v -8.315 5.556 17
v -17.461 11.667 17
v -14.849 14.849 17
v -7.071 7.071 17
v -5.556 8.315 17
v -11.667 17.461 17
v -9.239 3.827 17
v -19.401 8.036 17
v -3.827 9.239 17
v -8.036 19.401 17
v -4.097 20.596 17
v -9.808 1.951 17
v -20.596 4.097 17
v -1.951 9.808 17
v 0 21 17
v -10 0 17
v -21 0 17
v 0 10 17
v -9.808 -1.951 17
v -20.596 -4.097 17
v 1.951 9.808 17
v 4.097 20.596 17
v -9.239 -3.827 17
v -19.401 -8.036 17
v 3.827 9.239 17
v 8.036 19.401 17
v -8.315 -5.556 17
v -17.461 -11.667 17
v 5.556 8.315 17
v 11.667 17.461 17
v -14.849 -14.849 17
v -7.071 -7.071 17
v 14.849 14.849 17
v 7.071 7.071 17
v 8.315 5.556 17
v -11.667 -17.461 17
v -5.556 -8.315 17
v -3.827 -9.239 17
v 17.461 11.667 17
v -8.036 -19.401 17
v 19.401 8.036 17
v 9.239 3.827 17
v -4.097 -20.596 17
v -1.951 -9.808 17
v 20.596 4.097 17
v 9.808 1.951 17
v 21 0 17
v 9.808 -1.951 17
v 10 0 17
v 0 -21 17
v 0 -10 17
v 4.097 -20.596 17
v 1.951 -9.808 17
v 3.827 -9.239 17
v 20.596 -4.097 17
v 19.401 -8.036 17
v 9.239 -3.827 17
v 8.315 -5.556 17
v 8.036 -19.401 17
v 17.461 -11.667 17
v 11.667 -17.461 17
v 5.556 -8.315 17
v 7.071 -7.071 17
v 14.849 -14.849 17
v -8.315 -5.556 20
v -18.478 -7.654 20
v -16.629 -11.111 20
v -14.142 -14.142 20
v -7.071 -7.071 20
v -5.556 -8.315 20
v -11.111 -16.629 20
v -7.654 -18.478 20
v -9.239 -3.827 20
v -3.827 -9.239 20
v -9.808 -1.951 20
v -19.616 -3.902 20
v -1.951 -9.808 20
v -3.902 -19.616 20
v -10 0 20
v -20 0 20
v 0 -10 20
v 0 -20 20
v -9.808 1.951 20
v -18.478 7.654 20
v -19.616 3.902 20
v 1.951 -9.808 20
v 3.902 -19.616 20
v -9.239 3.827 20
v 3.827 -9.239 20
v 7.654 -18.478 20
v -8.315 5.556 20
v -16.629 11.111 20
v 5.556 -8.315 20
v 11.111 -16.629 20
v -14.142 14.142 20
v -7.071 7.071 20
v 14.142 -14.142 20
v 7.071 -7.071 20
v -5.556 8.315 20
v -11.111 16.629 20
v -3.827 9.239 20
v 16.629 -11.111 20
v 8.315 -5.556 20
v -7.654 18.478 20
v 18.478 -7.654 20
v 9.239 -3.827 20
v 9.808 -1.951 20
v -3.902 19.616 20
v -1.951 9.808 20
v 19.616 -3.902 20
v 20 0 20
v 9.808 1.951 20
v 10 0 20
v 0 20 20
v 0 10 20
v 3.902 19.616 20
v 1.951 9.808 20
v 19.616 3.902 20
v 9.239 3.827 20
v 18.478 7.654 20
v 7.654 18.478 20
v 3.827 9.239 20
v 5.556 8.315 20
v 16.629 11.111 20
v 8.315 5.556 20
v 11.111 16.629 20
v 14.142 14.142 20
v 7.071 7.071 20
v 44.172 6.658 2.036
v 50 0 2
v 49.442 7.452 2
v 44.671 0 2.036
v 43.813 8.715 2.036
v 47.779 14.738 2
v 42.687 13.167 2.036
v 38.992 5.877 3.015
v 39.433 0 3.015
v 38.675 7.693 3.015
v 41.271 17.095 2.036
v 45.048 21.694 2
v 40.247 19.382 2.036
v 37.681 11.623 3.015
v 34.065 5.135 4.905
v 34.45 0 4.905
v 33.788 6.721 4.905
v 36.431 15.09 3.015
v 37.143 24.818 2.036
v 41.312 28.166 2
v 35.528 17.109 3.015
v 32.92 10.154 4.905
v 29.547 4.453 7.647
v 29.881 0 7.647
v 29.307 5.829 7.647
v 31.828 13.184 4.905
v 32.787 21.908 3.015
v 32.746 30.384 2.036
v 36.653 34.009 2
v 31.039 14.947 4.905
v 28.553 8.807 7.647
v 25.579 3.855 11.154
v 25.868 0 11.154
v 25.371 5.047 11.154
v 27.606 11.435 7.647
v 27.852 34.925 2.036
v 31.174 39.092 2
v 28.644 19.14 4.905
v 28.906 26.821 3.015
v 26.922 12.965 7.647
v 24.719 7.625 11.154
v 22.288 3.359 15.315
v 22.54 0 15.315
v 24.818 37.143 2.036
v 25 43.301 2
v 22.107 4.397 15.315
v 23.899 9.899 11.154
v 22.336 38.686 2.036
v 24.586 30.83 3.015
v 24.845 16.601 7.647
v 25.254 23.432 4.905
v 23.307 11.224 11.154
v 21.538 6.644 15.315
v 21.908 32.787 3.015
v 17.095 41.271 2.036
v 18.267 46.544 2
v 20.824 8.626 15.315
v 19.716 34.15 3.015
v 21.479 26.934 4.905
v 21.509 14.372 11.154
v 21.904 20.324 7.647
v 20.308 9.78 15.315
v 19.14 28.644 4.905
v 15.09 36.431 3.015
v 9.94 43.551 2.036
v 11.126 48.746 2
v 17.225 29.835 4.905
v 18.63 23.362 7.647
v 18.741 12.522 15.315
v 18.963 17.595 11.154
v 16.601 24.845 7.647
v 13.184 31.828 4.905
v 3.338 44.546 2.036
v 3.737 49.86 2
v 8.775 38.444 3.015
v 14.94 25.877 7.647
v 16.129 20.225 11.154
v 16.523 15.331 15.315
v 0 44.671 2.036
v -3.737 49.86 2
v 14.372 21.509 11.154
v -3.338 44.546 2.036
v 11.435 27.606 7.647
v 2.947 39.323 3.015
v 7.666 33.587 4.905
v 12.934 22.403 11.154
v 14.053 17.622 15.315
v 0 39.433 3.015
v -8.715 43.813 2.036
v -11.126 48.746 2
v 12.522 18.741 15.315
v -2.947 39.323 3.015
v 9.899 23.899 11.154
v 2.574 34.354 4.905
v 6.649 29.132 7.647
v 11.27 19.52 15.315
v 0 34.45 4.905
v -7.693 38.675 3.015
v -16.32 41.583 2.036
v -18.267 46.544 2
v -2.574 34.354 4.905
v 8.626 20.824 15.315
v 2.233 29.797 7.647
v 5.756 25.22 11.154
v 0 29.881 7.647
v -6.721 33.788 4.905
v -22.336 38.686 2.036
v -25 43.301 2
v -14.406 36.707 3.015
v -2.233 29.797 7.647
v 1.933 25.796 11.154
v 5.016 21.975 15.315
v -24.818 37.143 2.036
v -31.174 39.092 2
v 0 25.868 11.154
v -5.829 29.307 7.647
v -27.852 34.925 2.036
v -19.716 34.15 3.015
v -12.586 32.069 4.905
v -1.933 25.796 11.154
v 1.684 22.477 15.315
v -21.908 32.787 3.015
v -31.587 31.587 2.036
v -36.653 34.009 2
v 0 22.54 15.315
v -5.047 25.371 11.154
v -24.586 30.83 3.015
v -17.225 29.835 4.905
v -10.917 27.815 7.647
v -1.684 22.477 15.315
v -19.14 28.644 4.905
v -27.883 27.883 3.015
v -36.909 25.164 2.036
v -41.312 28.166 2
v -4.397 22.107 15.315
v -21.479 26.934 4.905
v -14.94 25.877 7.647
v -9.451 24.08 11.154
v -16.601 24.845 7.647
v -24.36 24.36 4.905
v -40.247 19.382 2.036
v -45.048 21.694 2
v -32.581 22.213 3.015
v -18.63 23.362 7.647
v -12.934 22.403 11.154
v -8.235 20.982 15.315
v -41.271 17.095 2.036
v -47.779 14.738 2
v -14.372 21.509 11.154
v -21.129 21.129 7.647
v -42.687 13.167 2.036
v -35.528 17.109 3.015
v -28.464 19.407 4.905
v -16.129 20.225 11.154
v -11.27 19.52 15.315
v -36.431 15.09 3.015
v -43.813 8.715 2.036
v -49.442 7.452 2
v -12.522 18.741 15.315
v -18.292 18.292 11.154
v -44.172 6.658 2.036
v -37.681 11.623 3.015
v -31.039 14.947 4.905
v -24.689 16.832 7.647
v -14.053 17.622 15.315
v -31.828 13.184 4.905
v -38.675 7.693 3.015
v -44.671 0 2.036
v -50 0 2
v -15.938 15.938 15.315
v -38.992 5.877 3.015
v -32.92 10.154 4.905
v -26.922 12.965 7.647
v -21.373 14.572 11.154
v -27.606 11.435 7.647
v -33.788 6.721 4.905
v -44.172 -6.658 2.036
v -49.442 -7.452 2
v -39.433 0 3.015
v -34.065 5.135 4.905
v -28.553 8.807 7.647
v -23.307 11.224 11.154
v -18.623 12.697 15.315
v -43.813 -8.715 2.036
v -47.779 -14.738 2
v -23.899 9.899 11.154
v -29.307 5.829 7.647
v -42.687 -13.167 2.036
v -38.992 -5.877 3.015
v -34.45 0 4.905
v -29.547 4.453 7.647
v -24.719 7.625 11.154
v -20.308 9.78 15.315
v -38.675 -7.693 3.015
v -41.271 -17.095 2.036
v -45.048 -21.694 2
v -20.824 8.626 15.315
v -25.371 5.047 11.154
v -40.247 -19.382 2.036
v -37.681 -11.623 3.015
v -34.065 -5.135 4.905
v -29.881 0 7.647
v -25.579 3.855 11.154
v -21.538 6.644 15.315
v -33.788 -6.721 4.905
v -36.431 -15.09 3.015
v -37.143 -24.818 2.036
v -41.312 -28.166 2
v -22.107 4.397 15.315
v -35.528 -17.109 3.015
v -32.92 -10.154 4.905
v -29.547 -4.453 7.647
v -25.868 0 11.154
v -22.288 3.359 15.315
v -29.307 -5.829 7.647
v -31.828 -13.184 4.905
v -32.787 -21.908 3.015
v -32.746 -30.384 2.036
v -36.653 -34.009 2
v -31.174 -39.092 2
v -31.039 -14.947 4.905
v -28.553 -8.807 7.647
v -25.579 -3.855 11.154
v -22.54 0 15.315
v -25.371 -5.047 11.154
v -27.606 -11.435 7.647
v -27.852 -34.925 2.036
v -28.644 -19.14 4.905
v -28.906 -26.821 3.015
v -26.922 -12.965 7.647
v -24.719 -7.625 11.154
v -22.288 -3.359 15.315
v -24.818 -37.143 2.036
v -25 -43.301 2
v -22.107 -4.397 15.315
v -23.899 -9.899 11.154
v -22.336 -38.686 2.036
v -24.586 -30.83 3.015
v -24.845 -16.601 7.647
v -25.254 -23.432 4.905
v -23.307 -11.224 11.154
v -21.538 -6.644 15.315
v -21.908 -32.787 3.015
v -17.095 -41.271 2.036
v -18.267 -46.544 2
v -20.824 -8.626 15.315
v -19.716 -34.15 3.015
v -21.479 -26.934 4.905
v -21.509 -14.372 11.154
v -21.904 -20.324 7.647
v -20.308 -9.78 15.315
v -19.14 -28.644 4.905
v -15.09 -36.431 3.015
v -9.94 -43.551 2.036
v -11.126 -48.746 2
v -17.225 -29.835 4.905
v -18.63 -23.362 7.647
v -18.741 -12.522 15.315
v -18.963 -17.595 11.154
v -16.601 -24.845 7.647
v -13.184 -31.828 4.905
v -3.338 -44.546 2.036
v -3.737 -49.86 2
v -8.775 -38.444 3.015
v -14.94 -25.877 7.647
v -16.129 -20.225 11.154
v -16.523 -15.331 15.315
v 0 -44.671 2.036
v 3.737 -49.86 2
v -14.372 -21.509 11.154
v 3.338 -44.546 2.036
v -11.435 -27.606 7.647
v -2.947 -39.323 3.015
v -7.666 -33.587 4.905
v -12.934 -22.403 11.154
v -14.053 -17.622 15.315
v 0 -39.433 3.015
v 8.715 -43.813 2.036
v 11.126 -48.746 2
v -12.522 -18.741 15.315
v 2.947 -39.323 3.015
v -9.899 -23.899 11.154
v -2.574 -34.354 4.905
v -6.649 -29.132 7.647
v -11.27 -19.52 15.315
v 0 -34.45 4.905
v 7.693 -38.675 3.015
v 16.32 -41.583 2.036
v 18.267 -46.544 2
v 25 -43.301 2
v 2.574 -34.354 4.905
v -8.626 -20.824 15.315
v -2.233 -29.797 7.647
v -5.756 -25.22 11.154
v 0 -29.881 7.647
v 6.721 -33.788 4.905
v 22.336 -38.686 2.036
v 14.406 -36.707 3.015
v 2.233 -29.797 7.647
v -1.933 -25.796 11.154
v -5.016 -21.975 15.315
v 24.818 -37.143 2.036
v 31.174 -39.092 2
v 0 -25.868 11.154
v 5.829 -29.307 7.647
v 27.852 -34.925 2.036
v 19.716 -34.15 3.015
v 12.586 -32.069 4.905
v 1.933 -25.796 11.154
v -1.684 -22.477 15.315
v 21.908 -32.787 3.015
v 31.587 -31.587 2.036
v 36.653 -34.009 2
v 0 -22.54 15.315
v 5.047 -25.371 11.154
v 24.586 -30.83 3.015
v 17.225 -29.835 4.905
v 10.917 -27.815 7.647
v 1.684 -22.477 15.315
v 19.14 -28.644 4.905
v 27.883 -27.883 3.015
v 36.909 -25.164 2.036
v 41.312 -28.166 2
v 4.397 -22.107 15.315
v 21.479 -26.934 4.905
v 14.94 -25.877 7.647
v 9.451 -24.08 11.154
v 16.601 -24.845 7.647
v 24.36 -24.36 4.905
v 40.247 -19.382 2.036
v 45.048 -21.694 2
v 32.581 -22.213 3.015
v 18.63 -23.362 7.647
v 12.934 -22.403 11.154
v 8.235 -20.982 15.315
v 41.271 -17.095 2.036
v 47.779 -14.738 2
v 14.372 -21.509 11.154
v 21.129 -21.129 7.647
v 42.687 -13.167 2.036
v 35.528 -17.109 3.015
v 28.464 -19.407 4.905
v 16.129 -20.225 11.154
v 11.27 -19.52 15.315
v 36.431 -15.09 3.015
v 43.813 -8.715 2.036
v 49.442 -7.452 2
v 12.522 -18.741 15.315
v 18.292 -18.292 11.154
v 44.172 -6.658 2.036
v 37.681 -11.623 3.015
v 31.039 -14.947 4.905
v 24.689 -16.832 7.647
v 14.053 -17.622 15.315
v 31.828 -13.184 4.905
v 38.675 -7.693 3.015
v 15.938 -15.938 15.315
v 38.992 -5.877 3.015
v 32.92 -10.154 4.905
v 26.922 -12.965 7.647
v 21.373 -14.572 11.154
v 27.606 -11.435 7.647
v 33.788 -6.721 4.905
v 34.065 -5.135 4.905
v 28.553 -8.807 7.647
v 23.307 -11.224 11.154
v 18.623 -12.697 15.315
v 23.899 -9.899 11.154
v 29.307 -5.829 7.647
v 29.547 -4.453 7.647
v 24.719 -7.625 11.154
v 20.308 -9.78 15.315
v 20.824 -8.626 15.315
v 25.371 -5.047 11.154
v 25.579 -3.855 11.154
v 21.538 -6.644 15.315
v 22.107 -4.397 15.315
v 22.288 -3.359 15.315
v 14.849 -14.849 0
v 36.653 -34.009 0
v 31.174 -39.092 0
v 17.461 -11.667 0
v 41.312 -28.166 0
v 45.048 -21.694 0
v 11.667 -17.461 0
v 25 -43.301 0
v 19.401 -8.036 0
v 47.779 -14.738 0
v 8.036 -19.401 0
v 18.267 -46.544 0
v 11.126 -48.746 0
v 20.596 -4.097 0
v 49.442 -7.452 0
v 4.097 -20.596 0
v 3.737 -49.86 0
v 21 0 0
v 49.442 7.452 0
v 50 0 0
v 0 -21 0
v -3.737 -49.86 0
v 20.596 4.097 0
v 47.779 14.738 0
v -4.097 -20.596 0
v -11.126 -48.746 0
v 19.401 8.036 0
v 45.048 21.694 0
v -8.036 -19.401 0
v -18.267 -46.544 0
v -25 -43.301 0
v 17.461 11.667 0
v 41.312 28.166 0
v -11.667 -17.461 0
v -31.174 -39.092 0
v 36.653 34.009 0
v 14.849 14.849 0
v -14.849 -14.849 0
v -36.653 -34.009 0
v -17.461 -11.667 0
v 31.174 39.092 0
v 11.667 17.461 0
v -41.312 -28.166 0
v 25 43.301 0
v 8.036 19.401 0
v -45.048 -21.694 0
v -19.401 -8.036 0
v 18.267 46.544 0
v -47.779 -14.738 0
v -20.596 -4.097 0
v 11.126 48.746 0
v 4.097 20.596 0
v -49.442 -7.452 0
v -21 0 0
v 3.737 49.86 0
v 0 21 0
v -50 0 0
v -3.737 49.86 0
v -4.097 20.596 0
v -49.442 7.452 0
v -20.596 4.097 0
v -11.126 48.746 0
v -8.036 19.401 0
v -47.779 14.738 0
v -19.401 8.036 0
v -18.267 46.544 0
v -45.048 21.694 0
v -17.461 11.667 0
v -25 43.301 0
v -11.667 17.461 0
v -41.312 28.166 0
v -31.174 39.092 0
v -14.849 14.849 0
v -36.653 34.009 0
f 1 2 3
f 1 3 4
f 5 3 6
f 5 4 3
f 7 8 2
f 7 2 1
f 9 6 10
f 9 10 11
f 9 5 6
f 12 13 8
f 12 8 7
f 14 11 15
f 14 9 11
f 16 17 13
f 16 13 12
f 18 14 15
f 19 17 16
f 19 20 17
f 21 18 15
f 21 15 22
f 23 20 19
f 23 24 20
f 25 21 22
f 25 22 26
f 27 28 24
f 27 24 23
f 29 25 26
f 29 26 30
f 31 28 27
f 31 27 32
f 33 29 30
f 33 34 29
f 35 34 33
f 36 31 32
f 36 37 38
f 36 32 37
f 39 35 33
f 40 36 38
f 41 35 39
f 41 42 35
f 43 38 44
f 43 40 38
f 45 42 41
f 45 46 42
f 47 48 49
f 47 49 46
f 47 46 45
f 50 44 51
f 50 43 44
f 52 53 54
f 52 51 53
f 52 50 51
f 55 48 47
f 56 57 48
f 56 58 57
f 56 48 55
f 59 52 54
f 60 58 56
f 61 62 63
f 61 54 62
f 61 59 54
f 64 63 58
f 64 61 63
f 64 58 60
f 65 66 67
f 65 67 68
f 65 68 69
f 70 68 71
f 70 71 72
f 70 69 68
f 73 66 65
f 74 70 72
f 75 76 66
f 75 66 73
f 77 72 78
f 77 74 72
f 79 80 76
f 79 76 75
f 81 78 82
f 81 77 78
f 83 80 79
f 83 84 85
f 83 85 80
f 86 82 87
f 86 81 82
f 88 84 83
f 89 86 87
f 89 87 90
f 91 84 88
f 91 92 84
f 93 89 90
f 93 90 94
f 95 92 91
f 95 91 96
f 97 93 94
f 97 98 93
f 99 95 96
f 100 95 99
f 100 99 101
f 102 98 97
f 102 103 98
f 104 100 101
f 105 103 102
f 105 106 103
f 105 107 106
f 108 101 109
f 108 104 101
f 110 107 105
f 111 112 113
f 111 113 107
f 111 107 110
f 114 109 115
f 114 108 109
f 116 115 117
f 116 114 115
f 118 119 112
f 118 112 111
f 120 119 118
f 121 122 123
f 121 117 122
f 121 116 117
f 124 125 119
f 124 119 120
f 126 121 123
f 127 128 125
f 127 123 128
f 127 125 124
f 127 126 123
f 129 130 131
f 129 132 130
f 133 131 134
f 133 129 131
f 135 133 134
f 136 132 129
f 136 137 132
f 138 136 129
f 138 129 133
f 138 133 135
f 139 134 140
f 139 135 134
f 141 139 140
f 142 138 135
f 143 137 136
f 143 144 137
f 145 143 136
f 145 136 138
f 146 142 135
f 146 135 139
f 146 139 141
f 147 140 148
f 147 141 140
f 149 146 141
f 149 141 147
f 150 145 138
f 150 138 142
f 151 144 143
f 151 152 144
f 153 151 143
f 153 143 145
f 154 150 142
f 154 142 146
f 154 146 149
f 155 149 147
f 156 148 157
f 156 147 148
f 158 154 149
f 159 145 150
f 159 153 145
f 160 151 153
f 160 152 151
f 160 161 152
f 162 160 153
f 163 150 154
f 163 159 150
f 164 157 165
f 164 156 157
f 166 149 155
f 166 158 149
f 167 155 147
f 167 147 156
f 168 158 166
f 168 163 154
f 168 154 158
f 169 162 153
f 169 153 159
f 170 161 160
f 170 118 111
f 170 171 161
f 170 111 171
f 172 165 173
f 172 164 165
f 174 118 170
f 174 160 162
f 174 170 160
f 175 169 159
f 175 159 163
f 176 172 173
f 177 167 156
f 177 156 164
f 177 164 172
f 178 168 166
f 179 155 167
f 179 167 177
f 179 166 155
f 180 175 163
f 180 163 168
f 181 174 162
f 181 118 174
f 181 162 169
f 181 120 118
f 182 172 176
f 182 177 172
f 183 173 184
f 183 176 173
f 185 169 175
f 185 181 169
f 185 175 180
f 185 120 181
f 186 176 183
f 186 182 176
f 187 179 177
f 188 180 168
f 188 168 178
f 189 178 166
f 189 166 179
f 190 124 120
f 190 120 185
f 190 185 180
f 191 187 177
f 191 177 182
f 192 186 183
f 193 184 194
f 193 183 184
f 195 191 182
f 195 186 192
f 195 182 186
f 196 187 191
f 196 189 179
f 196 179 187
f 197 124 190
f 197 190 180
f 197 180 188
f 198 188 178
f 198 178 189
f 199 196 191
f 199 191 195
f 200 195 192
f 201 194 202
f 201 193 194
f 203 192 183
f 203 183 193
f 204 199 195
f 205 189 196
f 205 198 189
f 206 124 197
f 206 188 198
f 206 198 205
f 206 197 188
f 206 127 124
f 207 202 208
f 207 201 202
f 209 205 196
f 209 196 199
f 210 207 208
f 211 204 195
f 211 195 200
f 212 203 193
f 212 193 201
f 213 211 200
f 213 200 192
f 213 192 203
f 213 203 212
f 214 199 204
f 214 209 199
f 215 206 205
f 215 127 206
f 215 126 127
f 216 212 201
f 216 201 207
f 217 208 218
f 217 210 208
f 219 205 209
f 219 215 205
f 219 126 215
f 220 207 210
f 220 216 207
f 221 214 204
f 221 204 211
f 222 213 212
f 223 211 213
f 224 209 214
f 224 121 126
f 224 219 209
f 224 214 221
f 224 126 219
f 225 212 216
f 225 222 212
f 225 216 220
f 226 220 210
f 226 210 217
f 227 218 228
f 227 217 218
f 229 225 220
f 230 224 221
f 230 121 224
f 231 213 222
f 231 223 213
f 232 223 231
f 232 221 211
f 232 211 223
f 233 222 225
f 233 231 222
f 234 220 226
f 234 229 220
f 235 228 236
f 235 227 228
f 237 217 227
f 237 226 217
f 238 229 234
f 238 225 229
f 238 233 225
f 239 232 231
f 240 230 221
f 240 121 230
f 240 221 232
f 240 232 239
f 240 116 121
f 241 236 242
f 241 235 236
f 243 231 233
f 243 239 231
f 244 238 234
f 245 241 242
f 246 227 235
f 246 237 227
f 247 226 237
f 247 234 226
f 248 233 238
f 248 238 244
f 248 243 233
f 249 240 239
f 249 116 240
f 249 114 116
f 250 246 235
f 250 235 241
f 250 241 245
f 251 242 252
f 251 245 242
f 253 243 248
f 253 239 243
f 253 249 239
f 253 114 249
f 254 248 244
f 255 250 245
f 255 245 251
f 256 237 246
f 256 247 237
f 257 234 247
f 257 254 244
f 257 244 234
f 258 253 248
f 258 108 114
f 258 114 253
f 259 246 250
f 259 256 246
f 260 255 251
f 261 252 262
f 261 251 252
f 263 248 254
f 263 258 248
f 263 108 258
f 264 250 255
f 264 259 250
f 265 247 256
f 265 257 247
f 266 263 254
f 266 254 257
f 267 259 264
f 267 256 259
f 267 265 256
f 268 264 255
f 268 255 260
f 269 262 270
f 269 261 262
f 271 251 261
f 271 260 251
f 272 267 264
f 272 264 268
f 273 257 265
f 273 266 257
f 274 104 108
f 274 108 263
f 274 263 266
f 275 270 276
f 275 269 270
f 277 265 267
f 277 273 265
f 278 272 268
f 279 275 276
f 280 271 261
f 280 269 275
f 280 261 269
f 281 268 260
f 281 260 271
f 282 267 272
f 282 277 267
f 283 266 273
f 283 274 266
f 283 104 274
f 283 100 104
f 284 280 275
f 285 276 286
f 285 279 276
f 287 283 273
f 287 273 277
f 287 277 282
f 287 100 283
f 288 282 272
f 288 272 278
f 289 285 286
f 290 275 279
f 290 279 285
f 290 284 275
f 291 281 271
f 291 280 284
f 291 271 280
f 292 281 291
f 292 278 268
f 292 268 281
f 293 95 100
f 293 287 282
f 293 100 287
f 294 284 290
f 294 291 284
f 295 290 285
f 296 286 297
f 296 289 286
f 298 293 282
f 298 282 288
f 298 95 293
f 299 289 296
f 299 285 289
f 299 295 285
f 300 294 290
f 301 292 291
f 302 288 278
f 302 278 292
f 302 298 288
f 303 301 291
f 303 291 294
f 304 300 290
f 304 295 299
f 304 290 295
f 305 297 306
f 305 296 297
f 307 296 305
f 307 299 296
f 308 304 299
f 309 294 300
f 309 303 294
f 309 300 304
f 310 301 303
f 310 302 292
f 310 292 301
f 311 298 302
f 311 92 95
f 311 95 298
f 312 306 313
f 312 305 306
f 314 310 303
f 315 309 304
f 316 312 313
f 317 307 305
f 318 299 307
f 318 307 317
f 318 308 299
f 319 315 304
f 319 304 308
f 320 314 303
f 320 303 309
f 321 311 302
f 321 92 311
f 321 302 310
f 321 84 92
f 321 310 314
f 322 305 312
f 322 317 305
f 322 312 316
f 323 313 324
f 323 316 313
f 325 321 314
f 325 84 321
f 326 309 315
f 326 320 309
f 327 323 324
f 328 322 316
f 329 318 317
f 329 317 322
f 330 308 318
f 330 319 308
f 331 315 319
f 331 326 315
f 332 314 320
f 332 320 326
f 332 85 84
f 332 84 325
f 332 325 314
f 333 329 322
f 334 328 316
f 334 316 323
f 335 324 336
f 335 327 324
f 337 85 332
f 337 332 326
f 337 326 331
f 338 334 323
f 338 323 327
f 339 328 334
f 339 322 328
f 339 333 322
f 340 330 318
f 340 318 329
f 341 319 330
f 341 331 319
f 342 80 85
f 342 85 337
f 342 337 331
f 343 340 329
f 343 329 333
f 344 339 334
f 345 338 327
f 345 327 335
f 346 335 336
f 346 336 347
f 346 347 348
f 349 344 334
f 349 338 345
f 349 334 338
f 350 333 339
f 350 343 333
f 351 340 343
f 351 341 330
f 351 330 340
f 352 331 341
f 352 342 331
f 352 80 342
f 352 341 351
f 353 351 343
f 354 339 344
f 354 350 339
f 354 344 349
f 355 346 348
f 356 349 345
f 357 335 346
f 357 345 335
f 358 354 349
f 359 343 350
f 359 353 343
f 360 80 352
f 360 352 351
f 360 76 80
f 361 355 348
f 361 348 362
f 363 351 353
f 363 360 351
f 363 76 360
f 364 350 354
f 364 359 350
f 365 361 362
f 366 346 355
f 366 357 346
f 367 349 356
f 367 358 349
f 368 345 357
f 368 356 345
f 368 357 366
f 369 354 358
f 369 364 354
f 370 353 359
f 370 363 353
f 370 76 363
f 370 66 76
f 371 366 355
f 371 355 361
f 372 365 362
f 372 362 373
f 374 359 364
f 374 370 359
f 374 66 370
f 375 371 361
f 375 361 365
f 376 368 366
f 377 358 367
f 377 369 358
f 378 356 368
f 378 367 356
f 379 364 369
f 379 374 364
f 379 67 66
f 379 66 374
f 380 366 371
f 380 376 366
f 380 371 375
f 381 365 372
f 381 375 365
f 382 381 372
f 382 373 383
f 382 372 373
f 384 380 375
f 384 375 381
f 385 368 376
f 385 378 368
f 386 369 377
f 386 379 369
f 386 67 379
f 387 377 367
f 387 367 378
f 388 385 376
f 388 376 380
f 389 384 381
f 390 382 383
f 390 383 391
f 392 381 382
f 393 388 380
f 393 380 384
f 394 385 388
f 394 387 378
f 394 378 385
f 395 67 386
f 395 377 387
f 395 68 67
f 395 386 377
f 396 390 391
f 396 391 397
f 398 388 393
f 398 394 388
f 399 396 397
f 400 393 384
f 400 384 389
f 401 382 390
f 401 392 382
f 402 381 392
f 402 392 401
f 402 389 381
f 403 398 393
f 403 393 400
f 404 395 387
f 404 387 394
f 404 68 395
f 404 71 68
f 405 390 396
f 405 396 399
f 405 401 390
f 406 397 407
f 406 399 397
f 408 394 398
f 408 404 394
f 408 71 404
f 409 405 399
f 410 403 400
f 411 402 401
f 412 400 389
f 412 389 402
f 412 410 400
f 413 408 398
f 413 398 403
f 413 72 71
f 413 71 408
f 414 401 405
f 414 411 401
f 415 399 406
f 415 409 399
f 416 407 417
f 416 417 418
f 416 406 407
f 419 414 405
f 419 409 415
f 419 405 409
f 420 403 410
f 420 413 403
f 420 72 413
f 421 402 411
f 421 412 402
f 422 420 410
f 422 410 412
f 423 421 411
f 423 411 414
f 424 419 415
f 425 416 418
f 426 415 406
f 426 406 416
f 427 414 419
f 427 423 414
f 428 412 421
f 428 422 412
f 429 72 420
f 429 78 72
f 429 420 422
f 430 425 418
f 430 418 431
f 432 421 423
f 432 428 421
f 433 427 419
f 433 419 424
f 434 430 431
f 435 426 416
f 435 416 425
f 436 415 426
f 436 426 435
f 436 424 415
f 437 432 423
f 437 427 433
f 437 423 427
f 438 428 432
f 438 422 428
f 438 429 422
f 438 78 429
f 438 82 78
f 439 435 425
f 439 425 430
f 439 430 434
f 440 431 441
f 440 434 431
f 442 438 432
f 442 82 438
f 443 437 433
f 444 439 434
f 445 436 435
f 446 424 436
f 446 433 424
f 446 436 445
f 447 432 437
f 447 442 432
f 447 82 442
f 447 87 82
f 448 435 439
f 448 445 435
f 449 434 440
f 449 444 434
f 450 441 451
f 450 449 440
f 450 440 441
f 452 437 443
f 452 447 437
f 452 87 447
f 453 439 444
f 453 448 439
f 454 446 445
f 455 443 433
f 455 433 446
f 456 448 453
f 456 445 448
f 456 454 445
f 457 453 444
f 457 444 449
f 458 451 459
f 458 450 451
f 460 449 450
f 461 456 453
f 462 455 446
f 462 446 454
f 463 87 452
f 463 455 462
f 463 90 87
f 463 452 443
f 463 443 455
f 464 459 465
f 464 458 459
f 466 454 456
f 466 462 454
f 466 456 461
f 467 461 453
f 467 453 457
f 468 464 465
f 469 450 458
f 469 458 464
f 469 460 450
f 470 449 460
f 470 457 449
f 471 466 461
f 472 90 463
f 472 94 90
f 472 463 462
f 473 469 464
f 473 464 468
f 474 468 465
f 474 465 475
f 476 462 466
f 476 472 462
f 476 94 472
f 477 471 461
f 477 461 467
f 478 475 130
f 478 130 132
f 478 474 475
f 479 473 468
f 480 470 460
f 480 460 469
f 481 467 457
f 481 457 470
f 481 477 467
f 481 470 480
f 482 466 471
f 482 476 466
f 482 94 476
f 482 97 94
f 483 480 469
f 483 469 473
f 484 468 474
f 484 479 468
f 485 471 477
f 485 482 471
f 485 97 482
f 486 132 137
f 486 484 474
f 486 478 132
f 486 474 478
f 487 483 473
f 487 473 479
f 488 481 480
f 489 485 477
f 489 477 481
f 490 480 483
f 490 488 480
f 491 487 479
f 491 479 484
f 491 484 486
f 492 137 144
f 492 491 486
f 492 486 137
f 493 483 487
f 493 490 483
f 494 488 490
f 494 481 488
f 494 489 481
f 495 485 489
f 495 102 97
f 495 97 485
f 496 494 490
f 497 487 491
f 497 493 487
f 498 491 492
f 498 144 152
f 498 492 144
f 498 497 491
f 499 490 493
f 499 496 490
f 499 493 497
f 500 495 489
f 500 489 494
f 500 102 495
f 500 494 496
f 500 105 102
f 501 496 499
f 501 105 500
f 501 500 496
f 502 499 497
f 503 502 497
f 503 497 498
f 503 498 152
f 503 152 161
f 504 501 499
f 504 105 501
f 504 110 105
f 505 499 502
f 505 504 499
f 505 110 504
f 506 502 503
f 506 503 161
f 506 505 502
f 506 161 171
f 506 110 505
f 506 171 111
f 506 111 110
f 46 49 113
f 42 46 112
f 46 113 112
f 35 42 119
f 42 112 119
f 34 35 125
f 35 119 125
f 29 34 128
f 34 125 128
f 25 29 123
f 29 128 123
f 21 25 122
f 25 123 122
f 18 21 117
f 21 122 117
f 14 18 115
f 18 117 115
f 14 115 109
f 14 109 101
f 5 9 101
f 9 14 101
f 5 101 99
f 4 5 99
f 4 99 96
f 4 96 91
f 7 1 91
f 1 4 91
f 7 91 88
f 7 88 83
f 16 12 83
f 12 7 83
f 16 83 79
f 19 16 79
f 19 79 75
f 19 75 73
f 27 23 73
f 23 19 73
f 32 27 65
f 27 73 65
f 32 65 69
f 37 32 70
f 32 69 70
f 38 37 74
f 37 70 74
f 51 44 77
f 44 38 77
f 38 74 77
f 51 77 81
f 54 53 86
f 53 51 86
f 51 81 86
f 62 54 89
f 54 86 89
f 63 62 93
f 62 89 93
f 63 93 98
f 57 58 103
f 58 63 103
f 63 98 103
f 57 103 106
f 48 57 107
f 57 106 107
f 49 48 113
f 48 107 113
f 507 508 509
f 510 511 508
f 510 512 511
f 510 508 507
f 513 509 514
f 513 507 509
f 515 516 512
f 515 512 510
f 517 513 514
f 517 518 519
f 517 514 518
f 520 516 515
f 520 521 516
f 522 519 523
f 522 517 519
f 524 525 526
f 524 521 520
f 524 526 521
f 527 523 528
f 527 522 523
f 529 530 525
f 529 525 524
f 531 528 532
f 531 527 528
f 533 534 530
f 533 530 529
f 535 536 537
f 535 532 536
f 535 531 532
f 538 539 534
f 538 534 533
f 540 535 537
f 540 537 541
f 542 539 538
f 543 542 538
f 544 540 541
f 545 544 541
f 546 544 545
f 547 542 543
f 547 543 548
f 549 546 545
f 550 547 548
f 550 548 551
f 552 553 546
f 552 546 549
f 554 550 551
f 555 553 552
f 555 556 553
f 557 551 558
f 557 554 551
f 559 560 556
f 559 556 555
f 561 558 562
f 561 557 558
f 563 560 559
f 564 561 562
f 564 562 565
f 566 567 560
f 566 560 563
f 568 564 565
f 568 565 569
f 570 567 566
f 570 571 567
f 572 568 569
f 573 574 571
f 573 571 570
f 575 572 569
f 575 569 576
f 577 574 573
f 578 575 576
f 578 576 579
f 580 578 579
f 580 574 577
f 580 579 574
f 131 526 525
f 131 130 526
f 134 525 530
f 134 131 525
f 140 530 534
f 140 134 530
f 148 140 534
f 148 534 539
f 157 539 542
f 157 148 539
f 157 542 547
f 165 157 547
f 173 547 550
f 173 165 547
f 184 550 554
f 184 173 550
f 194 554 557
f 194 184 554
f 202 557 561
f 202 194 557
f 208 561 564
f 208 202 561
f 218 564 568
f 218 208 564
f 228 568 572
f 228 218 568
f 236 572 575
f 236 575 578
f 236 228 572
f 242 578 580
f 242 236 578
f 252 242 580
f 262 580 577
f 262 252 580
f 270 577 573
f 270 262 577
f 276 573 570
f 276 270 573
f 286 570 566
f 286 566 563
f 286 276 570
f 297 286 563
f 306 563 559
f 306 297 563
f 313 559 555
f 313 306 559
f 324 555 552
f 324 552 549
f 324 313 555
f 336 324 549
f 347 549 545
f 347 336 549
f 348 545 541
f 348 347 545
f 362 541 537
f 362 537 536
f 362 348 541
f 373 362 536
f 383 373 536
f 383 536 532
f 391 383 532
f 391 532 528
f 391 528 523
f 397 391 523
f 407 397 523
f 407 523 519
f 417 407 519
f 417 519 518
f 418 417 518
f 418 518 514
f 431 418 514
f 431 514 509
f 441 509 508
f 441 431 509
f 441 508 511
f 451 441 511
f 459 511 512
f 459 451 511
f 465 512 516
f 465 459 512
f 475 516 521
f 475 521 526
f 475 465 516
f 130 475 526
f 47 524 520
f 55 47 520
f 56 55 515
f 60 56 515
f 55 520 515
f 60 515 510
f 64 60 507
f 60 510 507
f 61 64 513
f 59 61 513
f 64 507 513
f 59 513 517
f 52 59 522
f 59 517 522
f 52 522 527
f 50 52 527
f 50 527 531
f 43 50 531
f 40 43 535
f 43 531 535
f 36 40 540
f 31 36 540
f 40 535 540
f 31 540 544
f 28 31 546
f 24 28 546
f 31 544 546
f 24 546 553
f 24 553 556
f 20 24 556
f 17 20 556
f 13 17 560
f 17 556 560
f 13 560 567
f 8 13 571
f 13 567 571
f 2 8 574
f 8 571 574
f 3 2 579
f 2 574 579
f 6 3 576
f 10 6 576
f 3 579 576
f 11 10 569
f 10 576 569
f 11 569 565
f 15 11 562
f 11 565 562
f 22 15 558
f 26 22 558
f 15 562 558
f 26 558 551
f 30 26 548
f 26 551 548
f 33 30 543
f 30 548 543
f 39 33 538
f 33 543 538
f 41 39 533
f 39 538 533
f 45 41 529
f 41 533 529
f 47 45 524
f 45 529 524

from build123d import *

# Parameters (mm, degrees)
F2_R     = 10
F3_DEPTH = 20.001
F4_R     = 21
F4_R_2   = 10
F5_DEPTH = 17


with BuildPart() as f1:
    # F0 (on Front) → F1 (revolve)
    with BuildSketch(Plane.XZ):
        with BuildLine():
            Line((0, 20), (0, 0))
            Line((0, 0), (50, 0))
            Line((50, 0), (50, 2))
            ThreePointArc((50, 2), (32.104477, 6.174129), (20, 20))
            Line((20, 20), (0, 20))
        make_face()
    revolve(axis=Axis((0, 0, 10), (0, 0, 1)))

    # F2 (on face) → F3 (cut, through all)
    with BuildSketch(Plane.XY.offset(20)):
        Circle(F2_R)
    extrude(amount=-F3_DEPTH, mode=Mode.SUBTRACT)

    # F4 (on face) → F5 (cut)
    with BuildSketch(Plane(origin=(0, 0, 0), x_dir=(1, 0, 0), z_dir=(0, 0, -1))):
        Circle(F4_R)
        Circle(F4_R_2, mode=Mode.SUBTRACT)
    extrude(amount=-F5_DEPTH, mode=Mode.SUBTRACT)


solid = f1.part
